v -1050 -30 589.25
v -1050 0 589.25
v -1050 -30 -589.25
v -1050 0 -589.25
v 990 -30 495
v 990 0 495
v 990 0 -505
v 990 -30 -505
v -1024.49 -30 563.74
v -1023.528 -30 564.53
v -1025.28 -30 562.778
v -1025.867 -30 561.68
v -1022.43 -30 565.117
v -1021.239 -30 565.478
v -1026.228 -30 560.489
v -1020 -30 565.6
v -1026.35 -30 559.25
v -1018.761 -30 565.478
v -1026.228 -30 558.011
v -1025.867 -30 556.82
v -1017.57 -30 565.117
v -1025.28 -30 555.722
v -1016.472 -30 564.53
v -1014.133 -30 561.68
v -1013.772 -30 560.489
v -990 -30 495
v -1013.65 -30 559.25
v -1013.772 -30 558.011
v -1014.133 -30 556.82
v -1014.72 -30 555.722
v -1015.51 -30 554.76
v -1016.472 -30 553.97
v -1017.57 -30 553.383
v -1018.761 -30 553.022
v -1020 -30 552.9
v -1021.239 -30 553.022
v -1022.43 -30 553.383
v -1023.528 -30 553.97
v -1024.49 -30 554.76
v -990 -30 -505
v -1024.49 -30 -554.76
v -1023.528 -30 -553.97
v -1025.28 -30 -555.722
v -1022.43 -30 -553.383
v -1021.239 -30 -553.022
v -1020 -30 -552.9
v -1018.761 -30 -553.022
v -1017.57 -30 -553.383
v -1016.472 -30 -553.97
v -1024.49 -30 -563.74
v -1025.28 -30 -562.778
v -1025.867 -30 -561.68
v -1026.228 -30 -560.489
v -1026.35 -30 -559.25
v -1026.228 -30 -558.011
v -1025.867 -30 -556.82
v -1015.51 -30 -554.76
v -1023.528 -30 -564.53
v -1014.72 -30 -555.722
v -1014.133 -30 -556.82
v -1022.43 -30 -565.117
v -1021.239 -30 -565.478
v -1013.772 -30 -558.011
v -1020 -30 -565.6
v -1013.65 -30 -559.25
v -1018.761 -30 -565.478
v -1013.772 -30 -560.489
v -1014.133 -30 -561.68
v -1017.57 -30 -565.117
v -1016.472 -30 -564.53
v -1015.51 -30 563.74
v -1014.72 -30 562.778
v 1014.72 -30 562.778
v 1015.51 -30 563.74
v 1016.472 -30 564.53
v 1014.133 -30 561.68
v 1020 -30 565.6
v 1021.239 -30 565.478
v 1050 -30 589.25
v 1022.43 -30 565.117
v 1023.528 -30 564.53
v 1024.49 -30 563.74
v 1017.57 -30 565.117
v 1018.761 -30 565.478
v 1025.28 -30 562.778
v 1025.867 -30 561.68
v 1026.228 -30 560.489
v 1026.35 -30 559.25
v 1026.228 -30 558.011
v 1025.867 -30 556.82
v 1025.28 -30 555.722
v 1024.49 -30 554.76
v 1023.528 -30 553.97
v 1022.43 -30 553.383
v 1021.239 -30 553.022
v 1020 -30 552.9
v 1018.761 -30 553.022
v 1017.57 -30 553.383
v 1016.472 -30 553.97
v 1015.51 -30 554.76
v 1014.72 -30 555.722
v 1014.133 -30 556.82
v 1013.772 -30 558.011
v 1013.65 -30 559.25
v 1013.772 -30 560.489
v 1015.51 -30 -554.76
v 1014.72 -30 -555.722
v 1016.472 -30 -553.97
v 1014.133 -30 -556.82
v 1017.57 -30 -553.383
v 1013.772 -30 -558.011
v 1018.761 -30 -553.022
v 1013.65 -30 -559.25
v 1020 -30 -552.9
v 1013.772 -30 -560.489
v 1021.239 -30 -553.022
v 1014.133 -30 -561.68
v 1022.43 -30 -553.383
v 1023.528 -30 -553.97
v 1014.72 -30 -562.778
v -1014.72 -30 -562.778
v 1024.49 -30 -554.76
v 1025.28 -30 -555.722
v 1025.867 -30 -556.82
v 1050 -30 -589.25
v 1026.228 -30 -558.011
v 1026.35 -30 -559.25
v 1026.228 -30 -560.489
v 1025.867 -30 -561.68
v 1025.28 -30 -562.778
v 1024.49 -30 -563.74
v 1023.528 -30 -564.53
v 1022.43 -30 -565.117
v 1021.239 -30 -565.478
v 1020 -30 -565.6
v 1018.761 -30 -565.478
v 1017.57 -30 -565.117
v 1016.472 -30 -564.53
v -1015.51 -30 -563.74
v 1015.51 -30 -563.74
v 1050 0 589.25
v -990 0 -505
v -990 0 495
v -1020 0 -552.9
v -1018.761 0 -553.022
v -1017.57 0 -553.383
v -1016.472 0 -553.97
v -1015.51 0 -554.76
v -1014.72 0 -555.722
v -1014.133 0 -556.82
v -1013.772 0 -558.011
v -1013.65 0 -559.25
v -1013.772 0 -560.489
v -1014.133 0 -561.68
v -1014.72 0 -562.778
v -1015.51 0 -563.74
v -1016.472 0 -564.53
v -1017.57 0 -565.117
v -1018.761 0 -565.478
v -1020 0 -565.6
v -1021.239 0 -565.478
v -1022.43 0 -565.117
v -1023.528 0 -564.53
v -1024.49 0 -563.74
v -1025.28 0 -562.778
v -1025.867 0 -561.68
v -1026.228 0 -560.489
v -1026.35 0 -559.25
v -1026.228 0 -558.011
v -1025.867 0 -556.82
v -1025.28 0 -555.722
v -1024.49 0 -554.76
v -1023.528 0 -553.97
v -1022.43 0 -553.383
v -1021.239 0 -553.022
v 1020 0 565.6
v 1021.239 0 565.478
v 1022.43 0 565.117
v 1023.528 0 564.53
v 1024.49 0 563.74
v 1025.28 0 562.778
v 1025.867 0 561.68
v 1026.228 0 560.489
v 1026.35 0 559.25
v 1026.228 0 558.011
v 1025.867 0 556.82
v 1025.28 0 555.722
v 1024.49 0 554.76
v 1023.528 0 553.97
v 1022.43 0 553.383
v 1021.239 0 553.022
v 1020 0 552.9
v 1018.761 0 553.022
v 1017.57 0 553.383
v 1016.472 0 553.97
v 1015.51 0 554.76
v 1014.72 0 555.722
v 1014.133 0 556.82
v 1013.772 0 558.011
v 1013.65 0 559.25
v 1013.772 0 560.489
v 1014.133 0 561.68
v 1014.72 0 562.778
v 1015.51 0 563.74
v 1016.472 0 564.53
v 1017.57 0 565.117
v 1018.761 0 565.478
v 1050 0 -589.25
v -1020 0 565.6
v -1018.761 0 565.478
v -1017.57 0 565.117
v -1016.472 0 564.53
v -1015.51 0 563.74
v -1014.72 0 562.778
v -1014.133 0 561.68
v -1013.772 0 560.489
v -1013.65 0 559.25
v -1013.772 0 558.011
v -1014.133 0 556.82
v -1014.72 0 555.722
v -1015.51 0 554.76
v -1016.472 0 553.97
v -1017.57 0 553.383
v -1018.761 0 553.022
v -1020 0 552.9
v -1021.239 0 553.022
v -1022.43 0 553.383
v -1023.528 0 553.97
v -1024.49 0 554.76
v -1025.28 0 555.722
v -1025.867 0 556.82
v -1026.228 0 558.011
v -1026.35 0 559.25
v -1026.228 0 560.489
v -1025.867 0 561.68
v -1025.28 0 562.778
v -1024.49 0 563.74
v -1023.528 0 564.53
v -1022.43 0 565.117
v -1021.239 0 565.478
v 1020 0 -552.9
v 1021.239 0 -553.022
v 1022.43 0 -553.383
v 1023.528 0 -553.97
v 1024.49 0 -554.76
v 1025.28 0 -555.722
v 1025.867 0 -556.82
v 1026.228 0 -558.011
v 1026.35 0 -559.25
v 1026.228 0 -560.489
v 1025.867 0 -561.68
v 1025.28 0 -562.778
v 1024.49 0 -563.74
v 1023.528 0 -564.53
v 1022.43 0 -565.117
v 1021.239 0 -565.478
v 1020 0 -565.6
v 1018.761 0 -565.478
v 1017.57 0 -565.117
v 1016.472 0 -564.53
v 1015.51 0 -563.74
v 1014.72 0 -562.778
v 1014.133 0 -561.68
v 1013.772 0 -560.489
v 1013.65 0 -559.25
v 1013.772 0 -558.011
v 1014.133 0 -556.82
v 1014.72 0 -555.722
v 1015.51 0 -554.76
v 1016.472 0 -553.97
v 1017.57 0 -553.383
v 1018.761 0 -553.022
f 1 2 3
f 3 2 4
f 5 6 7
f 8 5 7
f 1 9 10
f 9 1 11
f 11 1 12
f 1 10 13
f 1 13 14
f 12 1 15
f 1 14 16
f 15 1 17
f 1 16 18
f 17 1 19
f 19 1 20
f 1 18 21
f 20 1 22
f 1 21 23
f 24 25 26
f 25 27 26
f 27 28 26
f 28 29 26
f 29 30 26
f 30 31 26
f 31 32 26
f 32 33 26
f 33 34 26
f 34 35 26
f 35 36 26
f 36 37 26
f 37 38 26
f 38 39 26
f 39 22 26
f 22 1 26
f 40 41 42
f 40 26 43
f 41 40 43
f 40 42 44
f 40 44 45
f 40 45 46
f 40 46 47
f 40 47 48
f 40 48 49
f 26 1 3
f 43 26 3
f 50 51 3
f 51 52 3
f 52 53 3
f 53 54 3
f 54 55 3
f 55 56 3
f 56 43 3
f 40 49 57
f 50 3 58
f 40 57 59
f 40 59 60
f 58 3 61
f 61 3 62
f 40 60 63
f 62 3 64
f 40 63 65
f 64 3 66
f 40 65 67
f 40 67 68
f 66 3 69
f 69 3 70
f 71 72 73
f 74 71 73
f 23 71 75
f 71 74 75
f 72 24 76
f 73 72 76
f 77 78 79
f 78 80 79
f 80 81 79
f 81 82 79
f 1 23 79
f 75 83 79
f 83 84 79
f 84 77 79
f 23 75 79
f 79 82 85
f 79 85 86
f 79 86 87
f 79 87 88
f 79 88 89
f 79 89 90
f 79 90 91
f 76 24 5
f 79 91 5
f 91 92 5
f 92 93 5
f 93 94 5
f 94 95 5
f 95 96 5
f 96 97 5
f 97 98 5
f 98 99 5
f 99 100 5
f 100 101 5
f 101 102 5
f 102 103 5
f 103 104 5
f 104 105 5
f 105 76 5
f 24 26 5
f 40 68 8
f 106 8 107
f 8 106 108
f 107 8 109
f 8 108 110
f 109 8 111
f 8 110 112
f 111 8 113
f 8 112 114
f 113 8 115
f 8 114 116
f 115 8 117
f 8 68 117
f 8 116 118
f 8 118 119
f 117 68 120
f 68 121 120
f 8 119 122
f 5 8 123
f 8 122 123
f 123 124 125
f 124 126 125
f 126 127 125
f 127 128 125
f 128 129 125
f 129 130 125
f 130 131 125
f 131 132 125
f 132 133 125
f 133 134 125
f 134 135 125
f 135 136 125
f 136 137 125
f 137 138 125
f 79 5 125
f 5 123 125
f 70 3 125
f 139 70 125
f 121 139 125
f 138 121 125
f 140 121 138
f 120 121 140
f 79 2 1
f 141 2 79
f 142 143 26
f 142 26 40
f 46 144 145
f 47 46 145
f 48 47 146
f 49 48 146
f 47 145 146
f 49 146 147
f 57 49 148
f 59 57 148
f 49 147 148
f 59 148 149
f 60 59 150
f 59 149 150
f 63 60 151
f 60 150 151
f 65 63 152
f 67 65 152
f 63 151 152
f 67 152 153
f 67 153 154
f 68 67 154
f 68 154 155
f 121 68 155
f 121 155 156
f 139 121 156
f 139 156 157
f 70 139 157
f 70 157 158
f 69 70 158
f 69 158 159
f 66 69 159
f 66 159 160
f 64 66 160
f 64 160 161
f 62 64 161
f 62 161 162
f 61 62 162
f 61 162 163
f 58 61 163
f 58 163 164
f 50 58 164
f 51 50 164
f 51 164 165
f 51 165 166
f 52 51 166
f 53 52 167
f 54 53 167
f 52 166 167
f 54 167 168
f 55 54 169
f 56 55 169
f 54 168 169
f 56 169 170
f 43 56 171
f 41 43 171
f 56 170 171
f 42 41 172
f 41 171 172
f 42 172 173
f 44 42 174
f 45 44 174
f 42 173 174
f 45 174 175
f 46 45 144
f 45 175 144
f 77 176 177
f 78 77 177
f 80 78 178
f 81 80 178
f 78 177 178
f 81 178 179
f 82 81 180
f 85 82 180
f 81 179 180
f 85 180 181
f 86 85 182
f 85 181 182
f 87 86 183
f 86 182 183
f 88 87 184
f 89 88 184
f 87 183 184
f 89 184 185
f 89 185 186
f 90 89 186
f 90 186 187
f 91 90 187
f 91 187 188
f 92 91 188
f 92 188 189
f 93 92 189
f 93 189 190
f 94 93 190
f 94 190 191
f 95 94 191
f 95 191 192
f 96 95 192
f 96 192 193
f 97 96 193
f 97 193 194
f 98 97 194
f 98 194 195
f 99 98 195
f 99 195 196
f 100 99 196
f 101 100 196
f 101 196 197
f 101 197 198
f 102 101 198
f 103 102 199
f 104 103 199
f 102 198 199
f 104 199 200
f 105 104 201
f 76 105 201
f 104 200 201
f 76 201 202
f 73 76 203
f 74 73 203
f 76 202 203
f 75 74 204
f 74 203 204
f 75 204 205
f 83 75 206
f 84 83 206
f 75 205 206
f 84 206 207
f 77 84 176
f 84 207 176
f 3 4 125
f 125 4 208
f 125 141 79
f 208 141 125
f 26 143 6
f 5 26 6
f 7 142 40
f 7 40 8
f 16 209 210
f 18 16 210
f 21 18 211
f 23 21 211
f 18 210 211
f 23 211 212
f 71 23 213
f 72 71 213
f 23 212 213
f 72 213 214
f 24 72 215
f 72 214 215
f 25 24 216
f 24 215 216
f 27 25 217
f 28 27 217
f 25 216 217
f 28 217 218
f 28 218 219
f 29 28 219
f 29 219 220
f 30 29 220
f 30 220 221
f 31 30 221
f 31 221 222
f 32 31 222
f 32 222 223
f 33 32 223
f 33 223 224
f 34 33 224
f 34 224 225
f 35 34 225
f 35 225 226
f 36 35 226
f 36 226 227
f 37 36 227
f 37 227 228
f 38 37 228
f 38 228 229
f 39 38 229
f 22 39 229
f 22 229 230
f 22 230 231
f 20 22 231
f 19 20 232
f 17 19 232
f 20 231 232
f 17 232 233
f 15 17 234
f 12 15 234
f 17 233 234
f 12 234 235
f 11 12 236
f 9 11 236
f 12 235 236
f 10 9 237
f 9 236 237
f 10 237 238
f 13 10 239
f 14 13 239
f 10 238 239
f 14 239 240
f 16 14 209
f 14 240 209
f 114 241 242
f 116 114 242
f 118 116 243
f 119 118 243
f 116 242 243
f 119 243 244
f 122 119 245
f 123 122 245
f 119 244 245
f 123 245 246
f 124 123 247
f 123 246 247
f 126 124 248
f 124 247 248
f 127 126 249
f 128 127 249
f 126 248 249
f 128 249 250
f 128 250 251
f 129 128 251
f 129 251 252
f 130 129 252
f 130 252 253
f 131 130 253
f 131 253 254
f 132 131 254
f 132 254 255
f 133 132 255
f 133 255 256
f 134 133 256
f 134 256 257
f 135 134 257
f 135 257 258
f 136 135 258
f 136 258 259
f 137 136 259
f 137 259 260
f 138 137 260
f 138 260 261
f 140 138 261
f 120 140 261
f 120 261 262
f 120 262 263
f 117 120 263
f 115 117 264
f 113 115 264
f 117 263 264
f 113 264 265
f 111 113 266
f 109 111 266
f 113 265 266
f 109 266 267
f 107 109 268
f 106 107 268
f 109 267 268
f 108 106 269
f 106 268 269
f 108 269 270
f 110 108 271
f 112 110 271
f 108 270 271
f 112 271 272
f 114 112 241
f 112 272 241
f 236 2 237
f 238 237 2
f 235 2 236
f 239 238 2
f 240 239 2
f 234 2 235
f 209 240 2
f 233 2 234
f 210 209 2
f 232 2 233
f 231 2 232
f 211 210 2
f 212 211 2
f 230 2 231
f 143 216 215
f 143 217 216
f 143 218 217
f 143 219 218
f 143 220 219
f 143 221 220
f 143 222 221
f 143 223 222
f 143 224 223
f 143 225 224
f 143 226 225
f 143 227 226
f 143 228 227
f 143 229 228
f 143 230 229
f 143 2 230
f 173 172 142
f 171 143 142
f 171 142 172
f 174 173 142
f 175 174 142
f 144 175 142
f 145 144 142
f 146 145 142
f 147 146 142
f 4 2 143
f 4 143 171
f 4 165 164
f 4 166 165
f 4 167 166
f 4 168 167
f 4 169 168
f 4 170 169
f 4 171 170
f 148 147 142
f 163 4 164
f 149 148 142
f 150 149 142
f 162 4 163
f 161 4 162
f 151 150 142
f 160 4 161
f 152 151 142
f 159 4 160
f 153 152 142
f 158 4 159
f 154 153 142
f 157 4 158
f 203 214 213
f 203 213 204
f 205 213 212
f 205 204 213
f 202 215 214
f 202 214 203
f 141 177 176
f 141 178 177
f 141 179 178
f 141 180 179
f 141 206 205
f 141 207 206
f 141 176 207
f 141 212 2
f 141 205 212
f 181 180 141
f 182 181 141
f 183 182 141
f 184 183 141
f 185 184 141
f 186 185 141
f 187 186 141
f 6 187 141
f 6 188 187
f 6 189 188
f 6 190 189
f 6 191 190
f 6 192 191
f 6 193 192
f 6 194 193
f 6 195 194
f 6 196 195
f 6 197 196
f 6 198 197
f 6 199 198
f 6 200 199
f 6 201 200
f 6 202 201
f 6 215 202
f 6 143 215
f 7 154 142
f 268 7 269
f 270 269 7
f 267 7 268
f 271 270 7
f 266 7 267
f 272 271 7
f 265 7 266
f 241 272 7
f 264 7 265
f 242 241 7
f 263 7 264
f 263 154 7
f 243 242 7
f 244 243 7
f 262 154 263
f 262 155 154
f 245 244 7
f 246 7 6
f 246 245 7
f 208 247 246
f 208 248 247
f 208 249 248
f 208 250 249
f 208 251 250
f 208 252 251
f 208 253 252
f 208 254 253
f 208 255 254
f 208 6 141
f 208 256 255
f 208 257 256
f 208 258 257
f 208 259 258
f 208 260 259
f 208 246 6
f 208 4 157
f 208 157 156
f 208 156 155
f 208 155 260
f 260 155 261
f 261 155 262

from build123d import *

# Parameters (mm, degrees)
SKETCH1_W           = 2100
SKETCH1_H           = 1178.5
SKETCH1_W_2         = 1980
SKETCH1_H_2         = 1000
BOSS_EXTRUDE1_DEPTH = 30
SKETCH2_R           = 6.35
CUT_EXTRUDE1_DEPTH  = 1205.415029174


with BuildPart() as part:
    # Sketch1 → Boss-Extrude1 (new body)
    with BuildSketch(Plane(origin=(0, 0, 0), x_dir=(1, 0, 0), z_dir=(0, 1, 0))):
        Rectangle(SKETCH1_W, SKETCH1_H)
        with Locations((0, 5)):
            Rectangle(SKETCH1_W_2, SKETCH1_H_2, mode=Mode.SUBTRACT)
    extrude(amount=-BOSS_EXTRUDE1_DEPTH)

    # Sketch2 → Cut-Extrude1 (cut, through all)
    with BuildSketch(Plane(origin=(0, 0, 0), x_dir=(1, 0, 0), z_dir=(0, 1, 0))):
        with Locations(Location((-1020, 559.25, 0), (0, 0, 270))):
            Circle(SKETCH2_R)
        with Locations(Location((-1020, -559.25, 0), (0, 0, 270))):
            Circle(SKETCH2_R)
        with Locations(Location((1020, 559.25, 0), (0, 0, 270))):
            Circle(SKETCH2_R)
        with Locations(Location((1020, -559.25, 0), (0, 0, 270))):
            Circle(SKETCH2_R)
    extrude(amount=-CUT_EXTRUDE1_DEPTH, mode=Mode.SUBTRACT)


solid = part.part
